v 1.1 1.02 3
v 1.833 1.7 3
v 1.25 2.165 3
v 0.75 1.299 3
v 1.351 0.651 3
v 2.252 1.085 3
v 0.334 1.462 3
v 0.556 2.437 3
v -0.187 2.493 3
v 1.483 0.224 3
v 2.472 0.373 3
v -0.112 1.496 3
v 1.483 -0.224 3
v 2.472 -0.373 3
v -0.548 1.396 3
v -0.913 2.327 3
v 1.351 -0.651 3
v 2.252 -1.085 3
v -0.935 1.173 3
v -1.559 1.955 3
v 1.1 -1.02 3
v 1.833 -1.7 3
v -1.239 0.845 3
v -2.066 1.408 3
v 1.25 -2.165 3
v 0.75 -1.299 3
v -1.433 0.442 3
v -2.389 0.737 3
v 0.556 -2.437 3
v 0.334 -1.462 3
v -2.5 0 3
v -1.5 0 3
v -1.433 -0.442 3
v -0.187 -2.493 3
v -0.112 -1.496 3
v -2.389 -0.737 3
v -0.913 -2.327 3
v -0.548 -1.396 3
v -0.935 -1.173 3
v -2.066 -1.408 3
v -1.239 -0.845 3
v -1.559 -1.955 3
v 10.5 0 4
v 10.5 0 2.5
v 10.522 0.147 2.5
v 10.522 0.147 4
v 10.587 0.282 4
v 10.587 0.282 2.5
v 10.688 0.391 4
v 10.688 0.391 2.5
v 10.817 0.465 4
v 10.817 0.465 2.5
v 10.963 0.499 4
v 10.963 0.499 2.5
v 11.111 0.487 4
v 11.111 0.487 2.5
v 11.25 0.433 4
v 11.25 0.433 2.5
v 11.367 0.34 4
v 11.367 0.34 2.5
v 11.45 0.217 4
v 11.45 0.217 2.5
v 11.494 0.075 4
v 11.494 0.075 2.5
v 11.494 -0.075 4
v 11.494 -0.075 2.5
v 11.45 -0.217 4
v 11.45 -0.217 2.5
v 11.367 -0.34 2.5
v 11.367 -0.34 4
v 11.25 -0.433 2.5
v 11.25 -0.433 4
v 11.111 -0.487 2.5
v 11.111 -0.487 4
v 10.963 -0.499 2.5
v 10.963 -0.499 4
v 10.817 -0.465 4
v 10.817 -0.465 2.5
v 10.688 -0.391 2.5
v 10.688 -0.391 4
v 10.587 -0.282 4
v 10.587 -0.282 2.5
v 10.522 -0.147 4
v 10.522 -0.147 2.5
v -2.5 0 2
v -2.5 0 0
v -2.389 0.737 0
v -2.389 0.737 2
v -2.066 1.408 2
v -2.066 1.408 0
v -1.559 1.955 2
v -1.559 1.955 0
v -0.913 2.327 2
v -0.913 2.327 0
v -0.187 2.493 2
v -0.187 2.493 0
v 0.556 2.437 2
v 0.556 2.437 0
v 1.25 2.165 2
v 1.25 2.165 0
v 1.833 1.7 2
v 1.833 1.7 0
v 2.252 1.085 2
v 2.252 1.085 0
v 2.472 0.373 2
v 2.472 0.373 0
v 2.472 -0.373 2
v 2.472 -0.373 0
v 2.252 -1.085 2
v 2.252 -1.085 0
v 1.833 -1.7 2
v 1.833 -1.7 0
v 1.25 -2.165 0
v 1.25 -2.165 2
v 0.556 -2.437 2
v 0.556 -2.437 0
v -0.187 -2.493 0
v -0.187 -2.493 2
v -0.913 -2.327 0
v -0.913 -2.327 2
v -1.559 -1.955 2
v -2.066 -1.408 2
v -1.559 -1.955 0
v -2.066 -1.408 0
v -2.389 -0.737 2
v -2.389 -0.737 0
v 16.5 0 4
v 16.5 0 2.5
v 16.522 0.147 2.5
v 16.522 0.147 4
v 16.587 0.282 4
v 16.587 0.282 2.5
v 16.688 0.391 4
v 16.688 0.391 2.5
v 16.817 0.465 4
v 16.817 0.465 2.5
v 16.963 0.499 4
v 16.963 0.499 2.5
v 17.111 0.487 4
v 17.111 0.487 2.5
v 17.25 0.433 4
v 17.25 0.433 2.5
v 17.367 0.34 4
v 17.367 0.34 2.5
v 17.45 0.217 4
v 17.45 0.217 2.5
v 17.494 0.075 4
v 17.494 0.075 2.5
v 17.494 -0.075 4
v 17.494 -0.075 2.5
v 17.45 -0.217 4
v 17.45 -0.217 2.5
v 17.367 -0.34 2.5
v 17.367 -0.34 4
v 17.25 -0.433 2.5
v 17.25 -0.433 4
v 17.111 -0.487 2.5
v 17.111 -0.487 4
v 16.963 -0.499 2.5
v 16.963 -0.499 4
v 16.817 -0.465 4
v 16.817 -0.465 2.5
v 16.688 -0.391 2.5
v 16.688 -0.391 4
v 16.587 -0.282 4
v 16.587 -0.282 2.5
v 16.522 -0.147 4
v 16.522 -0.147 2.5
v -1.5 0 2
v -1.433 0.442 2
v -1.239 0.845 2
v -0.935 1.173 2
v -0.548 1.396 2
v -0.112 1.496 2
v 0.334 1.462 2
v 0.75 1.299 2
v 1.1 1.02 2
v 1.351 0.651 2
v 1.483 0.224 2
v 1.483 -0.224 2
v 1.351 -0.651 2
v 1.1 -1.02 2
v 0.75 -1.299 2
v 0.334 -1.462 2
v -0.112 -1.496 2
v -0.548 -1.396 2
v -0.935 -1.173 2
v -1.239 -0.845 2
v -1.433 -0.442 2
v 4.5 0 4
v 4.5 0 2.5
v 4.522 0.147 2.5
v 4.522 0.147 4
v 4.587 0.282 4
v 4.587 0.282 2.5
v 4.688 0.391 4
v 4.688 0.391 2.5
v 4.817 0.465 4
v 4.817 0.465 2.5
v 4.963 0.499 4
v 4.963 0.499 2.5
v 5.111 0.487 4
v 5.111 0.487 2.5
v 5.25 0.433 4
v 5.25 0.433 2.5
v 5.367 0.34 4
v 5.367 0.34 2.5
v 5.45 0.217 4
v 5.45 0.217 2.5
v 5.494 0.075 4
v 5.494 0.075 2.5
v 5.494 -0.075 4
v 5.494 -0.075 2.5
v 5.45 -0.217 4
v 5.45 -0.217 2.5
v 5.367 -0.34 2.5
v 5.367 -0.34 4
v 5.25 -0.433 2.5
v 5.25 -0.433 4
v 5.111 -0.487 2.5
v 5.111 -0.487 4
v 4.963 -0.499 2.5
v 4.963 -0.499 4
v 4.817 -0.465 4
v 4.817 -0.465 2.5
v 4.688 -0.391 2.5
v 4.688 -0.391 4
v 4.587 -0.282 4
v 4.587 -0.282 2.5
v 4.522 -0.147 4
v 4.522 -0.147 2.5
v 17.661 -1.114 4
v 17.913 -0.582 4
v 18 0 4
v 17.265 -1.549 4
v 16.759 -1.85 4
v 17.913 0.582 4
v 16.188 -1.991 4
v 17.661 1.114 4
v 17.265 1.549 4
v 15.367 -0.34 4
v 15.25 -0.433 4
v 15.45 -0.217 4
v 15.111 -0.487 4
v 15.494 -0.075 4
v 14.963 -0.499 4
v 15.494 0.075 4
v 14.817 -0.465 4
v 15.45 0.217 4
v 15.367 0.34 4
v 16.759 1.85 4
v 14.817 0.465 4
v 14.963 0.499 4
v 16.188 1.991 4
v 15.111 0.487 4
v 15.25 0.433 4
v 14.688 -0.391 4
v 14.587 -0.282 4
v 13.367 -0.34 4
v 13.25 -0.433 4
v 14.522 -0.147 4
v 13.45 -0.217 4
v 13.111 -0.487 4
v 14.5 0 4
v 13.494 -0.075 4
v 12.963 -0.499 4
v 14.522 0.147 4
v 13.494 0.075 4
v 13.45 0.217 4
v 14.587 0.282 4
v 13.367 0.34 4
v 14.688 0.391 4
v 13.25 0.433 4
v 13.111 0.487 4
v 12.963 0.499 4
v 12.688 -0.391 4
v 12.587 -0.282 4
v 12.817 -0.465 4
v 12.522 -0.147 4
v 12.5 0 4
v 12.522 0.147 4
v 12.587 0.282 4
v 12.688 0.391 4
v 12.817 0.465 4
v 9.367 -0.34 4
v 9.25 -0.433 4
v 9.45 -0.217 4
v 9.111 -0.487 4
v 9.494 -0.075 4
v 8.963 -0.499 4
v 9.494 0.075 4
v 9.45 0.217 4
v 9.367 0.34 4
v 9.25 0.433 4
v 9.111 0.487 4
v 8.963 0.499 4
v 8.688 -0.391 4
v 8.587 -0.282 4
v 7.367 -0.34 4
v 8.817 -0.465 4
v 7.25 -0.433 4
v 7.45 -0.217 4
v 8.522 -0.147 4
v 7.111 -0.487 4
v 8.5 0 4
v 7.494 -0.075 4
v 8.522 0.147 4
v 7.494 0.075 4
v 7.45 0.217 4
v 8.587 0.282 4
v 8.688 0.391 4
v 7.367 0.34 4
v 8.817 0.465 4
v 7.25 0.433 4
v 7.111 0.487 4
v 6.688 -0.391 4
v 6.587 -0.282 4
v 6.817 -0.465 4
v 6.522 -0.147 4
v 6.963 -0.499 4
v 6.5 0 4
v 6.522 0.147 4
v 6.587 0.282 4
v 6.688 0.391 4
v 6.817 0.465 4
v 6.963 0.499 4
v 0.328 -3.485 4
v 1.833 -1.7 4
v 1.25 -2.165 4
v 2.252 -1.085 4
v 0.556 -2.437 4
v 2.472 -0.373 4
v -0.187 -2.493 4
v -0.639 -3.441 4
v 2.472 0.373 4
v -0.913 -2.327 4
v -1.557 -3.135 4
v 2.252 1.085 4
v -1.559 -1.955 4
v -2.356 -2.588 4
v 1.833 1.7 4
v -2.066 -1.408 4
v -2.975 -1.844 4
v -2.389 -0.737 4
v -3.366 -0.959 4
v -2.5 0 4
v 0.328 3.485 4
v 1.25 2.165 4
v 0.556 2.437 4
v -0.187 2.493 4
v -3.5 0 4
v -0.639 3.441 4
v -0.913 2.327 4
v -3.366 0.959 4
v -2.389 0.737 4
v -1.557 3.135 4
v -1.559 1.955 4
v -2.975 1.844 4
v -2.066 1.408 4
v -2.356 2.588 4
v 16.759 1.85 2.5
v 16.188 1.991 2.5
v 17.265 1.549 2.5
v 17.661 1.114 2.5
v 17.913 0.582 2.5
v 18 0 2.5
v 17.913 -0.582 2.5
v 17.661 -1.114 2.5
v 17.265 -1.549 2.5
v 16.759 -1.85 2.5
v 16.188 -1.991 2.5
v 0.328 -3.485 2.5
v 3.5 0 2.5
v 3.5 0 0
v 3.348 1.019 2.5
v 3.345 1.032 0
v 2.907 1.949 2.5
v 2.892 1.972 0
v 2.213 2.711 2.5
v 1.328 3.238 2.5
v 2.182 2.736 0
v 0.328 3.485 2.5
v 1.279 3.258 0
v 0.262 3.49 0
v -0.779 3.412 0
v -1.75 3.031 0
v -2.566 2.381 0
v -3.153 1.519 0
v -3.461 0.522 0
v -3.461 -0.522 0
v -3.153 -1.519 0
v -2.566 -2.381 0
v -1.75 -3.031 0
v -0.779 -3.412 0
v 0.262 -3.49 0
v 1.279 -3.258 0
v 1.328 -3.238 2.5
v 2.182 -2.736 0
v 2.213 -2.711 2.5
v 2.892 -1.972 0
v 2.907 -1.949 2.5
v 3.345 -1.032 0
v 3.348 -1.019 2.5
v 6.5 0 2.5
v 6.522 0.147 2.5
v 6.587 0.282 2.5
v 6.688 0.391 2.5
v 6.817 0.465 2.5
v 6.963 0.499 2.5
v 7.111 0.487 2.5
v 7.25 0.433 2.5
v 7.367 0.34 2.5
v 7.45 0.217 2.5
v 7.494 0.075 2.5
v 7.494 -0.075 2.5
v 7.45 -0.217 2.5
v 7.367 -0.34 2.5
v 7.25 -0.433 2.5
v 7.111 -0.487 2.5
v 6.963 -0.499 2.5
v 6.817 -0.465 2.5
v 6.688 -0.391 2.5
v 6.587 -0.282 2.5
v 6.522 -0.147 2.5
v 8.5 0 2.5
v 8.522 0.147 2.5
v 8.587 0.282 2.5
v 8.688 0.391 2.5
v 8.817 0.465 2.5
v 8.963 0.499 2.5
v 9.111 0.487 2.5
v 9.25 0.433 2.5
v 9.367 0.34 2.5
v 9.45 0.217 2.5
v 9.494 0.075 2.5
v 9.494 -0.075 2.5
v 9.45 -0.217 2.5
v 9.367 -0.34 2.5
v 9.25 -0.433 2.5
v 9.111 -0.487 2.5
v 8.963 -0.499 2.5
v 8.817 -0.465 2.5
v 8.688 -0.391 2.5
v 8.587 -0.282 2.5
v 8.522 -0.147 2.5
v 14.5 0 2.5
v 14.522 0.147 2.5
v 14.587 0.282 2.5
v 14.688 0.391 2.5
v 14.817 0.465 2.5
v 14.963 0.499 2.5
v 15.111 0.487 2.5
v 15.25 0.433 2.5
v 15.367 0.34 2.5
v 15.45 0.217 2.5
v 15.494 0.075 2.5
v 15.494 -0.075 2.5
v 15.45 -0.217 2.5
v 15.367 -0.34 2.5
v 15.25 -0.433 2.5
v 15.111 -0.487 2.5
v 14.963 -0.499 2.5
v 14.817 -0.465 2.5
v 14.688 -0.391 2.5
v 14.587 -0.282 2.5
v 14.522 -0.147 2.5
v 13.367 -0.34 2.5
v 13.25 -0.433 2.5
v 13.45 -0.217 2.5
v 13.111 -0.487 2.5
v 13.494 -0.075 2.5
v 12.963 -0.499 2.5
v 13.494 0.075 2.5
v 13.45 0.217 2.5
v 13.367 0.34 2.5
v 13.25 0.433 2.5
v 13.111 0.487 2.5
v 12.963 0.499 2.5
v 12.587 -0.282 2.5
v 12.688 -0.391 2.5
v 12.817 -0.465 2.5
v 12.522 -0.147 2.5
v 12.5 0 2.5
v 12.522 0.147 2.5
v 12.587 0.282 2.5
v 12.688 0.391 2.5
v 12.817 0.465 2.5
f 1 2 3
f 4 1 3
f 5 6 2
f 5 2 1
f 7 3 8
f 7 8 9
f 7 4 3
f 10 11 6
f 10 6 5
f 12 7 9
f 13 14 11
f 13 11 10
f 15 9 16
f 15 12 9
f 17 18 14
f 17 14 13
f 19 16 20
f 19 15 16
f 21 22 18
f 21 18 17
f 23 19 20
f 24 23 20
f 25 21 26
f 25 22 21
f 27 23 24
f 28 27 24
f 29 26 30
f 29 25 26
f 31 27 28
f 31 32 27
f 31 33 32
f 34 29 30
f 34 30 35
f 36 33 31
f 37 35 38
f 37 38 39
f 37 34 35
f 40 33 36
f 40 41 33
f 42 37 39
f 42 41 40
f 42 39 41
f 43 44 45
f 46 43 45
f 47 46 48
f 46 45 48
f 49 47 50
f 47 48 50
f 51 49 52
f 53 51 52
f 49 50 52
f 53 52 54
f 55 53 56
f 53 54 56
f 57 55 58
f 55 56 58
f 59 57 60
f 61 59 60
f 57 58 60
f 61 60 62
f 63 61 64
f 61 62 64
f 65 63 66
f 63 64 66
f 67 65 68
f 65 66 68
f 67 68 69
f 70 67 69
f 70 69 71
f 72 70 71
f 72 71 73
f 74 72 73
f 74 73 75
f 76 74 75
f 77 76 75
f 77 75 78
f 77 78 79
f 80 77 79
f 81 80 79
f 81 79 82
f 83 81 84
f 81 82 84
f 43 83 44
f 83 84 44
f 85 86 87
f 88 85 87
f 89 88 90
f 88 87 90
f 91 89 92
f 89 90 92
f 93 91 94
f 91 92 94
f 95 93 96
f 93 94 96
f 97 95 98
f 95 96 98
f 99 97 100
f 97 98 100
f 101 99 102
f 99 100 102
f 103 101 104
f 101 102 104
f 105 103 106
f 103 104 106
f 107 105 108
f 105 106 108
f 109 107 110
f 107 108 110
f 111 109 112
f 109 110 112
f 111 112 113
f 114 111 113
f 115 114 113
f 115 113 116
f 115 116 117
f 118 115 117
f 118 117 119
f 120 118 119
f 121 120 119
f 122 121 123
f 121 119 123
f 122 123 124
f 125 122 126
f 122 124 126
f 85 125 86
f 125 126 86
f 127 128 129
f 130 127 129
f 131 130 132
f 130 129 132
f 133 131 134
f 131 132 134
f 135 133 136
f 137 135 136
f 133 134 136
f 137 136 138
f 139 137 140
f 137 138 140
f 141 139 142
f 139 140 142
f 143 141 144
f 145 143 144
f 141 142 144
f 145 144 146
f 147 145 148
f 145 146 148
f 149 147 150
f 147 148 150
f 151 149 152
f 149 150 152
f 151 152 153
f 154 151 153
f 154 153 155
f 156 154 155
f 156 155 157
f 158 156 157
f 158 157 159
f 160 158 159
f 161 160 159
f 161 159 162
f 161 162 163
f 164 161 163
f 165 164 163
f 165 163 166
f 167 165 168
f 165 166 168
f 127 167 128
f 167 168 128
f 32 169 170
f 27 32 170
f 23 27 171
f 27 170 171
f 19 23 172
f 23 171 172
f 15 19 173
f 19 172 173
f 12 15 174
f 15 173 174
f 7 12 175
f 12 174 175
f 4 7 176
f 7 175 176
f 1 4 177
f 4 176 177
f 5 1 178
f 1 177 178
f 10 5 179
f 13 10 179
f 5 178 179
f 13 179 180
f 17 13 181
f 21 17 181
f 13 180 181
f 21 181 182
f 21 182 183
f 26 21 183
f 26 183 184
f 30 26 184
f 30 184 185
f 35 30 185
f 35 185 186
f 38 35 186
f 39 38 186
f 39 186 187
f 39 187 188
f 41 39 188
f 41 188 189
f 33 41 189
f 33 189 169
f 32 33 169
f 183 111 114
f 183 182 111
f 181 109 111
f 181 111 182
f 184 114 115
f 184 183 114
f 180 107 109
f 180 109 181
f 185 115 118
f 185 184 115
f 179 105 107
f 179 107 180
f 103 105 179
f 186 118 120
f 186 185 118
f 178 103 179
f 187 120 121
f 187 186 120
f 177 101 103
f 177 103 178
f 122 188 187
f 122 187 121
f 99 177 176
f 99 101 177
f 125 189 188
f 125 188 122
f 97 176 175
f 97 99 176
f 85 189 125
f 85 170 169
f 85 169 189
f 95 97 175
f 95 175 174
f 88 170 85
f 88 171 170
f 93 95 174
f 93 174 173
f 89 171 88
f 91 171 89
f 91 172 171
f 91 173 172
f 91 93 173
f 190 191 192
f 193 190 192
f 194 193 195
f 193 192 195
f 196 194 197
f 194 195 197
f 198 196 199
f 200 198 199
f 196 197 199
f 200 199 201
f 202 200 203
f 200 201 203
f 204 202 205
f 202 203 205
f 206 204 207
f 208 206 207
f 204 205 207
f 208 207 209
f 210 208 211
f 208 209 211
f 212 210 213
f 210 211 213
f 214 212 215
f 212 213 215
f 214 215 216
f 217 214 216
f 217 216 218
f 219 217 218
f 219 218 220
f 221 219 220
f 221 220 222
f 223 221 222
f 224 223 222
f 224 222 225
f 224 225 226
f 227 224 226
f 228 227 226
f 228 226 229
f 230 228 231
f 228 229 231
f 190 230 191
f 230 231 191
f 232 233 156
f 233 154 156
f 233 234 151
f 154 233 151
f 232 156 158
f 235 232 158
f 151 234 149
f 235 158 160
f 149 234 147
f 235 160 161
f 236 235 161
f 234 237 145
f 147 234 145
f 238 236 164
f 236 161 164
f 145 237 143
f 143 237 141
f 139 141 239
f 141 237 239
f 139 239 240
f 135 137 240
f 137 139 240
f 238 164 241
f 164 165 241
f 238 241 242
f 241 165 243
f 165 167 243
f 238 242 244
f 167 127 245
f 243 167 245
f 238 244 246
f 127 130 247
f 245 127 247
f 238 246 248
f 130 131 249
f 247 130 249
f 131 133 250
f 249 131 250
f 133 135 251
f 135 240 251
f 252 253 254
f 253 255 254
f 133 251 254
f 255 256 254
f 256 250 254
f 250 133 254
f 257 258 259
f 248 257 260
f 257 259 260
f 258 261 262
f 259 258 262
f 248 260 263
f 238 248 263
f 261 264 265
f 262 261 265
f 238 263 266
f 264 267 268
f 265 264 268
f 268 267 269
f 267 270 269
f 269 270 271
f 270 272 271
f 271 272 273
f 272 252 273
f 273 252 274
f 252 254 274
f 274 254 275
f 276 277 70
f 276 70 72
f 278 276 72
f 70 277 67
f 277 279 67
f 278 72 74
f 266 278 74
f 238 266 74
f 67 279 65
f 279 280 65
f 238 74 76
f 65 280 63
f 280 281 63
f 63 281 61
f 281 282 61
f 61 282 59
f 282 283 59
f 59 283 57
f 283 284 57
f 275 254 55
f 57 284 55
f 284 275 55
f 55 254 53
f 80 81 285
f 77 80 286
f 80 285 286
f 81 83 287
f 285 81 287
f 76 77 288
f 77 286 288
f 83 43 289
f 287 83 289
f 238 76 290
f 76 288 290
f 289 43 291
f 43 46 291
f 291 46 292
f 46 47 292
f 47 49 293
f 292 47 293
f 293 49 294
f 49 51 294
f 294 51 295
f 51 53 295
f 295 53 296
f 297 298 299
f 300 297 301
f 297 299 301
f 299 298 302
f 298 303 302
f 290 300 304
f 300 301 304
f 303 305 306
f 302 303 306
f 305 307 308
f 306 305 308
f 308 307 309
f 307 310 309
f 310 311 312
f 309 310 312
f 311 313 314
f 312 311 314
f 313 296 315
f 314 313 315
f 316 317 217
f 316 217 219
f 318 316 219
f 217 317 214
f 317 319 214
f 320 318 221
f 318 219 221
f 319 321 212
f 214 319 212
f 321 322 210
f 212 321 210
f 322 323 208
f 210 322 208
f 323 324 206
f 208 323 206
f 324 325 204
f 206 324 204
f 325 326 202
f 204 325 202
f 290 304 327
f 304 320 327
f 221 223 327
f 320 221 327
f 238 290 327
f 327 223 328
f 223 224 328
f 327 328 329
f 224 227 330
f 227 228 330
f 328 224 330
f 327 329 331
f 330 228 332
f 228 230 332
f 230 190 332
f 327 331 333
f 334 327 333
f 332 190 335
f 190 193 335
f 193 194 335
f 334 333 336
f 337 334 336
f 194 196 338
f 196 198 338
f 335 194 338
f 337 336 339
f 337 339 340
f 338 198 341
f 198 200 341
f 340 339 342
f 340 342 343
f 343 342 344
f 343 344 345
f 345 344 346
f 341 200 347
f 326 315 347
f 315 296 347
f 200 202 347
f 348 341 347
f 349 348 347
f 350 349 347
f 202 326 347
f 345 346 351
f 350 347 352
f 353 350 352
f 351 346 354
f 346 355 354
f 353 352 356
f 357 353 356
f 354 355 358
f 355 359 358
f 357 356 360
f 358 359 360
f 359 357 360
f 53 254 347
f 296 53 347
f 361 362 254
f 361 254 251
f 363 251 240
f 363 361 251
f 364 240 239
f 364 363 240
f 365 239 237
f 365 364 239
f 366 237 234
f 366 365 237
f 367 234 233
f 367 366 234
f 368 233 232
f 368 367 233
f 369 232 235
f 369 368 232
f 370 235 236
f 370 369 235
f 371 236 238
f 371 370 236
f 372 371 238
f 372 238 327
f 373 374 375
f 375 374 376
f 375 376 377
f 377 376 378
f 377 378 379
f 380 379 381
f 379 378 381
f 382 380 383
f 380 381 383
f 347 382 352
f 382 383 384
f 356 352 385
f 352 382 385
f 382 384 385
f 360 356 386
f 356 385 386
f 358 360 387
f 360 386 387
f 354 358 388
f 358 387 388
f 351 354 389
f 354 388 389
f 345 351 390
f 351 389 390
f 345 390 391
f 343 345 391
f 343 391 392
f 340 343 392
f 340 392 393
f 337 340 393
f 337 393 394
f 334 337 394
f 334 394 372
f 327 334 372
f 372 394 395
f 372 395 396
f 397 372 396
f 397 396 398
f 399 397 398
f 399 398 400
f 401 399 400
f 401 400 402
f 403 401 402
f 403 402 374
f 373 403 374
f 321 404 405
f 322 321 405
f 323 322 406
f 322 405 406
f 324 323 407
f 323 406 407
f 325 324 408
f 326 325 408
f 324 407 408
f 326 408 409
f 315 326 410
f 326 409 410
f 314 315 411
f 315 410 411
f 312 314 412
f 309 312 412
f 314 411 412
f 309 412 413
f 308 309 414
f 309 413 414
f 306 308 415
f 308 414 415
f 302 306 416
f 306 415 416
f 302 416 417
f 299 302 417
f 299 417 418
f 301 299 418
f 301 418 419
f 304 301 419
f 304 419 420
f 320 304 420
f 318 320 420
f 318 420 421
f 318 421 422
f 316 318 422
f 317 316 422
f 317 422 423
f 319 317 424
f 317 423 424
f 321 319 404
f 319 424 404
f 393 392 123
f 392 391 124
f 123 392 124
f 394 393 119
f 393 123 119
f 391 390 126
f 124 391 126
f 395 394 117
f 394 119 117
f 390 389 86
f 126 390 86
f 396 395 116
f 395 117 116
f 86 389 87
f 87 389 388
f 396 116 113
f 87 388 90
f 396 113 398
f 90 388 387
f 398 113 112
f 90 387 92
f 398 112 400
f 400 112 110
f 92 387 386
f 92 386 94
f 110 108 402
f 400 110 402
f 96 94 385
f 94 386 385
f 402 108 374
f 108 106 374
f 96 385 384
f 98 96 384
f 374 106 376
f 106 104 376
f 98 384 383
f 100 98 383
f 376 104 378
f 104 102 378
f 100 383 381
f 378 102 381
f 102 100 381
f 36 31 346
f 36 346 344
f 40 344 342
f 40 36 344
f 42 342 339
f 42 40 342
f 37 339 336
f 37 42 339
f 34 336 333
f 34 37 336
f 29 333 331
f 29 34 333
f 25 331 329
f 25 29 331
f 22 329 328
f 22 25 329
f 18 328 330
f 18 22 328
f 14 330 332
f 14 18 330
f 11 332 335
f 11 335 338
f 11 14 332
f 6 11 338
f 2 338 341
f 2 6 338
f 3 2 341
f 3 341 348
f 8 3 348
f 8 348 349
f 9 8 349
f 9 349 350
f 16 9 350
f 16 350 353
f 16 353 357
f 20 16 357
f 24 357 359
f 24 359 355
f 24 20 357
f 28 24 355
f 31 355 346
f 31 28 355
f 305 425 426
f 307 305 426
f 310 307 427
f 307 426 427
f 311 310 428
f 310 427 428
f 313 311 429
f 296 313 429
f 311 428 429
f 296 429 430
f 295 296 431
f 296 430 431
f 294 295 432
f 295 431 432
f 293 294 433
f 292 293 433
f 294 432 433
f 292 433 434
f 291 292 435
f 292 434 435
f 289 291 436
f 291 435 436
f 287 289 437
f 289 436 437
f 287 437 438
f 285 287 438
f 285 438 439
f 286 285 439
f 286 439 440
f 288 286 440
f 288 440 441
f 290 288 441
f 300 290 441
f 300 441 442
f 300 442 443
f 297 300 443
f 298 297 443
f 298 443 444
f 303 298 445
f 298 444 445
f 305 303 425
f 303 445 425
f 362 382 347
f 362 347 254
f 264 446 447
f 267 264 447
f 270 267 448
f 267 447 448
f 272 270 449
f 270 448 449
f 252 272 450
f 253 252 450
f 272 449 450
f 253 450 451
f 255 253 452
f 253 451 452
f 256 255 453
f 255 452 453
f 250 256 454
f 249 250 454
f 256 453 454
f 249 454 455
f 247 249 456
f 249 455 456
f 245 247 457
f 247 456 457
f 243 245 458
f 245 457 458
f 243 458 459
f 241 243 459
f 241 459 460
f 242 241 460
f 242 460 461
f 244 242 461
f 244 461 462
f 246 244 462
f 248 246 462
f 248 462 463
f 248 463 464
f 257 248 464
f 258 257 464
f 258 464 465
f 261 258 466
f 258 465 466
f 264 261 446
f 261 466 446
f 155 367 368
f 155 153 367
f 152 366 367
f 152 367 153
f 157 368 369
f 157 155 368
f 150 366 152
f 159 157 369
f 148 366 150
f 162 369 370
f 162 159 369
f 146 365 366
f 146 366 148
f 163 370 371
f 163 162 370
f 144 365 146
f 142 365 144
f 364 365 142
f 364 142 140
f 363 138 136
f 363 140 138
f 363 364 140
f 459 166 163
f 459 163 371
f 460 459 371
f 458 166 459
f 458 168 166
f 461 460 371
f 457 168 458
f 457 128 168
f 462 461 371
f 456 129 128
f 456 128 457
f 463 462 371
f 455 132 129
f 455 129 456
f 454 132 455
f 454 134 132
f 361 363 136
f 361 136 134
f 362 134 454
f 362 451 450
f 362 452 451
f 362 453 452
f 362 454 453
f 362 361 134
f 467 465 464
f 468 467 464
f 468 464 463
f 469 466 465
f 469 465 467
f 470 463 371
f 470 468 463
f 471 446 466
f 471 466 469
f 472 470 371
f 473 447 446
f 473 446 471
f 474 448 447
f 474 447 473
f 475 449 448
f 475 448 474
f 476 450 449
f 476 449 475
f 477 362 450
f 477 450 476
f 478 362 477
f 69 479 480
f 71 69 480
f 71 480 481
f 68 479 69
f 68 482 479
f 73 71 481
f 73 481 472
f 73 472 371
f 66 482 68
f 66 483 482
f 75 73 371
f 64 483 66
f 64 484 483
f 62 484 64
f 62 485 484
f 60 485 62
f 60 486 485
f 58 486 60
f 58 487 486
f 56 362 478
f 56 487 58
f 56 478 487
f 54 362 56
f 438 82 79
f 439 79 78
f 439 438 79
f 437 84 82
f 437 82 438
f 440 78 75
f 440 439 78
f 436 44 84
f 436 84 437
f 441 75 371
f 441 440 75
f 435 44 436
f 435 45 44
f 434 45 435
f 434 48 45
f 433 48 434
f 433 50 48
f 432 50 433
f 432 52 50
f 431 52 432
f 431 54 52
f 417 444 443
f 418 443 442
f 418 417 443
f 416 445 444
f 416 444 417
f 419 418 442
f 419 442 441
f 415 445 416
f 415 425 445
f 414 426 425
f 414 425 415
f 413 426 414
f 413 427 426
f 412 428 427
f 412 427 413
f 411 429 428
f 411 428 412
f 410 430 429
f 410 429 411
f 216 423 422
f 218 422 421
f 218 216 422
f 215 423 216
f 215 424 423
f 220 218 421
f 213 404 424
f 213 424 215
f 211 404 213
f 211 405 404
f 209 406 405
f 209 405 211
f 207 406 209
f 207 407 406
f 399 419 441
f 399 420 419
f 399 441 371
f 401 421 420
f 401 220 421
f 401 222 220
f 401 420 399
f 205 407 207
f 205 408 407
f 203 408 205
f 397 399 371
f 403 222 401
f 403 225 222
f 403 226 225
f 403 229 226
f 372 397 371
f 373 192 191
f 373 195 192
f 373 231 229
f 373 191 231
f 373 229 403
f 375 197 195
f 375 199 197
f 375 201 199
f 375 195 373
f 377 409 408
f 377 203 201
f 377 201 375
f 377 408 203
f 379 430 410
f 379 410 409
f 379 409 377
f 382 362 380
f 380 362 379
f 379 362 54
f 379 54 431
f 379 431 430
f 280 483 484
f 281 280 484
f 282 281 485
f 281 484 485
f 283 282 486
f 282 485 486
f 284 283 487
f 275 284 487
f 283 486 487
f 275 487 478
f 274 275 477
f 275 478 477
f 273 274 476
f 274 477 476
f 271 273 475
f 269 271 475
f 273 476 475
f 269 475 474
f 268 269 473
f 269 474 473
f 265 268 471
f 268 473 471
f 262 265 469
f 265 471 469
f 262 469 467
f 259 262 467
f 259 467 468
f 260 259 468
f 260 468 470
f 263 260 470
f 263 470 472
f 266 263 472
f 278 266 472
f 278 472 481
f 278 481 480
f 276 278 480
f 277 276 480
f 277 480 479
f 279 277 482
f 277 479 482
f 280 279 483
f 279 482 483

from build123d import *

# Parameters (mm, degrees)
SKETCH_1_R          = 3.5
EXTRUDE_1_DEPTH     = 4
EXTRUDE_START       = -1.5
EXTRUDE_2_DEPTH     = 1.5
SKETCH_3_R          = 0.5
CUT_EXTRUDE_1_DEPTH = 1.5
SKETCH_4_R          = 1.5
CUT_EXTRUDE_2_DEPTH = 55
SKETCH_5_R          = 2.5
CUT_EXTRUDE_3_DEPTH = 2
CUT_EXTRUDE_START   = -1
SKETCH_6_R          = 2.5
CUT_EXTRUDE_4_DEPTH = 1


with BuildPart() as part:
    # 草图1 → 凸台-拉伸1 (new body)
    with BuildSketch(Plane.XY):
        Circle(SKETCH_1_R)
    extrude(amount=EXTRUDE_1_DEPTH)

    # 草图2 → 凸台-拉伸2 (add)
    with BuildSketch(Plane.XY.offset(4).offset(EXTRUDE_START)):
        with BuildLine():
            Line((0.328125, 3.484585195), (16.1875, 1.99119154))
            ThreePointArc((16.1875, 1.99119154), (18, 0), (16.1875, -1.99119154))
            Line((16.1875, -1.99119154), (0.328125, -3.484585195))
            ThreePointArc((0.328125, -3.484585195), (3.5, 0), (0.328125, 3.484585195))
        make_face()
    extrude(amount=EXTRUDE_2_DEPTH)

    # 草图3 → 切除-拉伸1 (cut)
    with BuildSketch(Plane(origin=(0, 0, 2.5), x_dir=(-1, 0, 0), z_dir=(0, 0, -1))):
        with Locations((-7, 0)):
            Circle(SKETCH_3_R)
        with Locations((-9, 0)):
            Circle(SKETCH_3_R)
        with Locations((-11, 0)):
            Circle(SKETCH_3_R)
        with Locations((-13, 0)):
            Circle(SKETCH_3_R)
        with Locations((-15, 0)):
            Circle(SKETCH_3_R)
        with Locations((-5, 0)):
            Circle(SKETCH_3_R)
        with Locations((-17, 0)):
            Circle(SKETCH_3_R)
    extrude(amount=-CUT_EXTRUDE_1_DEPTH, mode=Mode.SUBTRACT)

    # 草图4 → 切除-拉伸2 (cut)
    with BuildSketch(Plane(origin=(0, 0, 0), x_dir=(-1, 0, 0), z_dir=(0, 0, -1))):
        Circle(SKETCH_4_R)
    extrude(amount=-CUT_EXTRUDE_2_DEPTH, mode=Mode.SUBTRACT)

    # 草图5 → 切除-拉伸3 (cut)
    with BuildSketch(Plane(origin=(0, 0, 0), x_dir=(-1, 0, 0), z_dir=(0, 0, -1))):
        Circle(SKETCH_5_R)
    extrude(amount=-CUT_EXTRUDE_3_DEPTH, mode=Mode.SUBTRACT)

    # 草图6 → 切除-拉伸4 (cut)
    with BuildSketch(Plane.XY.offset(4).offset(CUT_EXTRUDE_START)):
        with Locations(Location((0, 0, 0), (0, 0, 180))):
            Circle(SKETCH_6_R)
    extrude(amount=CUT_EXTRUDE_4_DEPTH, mode=Mode.SUBTRACT)


solid = part.part
